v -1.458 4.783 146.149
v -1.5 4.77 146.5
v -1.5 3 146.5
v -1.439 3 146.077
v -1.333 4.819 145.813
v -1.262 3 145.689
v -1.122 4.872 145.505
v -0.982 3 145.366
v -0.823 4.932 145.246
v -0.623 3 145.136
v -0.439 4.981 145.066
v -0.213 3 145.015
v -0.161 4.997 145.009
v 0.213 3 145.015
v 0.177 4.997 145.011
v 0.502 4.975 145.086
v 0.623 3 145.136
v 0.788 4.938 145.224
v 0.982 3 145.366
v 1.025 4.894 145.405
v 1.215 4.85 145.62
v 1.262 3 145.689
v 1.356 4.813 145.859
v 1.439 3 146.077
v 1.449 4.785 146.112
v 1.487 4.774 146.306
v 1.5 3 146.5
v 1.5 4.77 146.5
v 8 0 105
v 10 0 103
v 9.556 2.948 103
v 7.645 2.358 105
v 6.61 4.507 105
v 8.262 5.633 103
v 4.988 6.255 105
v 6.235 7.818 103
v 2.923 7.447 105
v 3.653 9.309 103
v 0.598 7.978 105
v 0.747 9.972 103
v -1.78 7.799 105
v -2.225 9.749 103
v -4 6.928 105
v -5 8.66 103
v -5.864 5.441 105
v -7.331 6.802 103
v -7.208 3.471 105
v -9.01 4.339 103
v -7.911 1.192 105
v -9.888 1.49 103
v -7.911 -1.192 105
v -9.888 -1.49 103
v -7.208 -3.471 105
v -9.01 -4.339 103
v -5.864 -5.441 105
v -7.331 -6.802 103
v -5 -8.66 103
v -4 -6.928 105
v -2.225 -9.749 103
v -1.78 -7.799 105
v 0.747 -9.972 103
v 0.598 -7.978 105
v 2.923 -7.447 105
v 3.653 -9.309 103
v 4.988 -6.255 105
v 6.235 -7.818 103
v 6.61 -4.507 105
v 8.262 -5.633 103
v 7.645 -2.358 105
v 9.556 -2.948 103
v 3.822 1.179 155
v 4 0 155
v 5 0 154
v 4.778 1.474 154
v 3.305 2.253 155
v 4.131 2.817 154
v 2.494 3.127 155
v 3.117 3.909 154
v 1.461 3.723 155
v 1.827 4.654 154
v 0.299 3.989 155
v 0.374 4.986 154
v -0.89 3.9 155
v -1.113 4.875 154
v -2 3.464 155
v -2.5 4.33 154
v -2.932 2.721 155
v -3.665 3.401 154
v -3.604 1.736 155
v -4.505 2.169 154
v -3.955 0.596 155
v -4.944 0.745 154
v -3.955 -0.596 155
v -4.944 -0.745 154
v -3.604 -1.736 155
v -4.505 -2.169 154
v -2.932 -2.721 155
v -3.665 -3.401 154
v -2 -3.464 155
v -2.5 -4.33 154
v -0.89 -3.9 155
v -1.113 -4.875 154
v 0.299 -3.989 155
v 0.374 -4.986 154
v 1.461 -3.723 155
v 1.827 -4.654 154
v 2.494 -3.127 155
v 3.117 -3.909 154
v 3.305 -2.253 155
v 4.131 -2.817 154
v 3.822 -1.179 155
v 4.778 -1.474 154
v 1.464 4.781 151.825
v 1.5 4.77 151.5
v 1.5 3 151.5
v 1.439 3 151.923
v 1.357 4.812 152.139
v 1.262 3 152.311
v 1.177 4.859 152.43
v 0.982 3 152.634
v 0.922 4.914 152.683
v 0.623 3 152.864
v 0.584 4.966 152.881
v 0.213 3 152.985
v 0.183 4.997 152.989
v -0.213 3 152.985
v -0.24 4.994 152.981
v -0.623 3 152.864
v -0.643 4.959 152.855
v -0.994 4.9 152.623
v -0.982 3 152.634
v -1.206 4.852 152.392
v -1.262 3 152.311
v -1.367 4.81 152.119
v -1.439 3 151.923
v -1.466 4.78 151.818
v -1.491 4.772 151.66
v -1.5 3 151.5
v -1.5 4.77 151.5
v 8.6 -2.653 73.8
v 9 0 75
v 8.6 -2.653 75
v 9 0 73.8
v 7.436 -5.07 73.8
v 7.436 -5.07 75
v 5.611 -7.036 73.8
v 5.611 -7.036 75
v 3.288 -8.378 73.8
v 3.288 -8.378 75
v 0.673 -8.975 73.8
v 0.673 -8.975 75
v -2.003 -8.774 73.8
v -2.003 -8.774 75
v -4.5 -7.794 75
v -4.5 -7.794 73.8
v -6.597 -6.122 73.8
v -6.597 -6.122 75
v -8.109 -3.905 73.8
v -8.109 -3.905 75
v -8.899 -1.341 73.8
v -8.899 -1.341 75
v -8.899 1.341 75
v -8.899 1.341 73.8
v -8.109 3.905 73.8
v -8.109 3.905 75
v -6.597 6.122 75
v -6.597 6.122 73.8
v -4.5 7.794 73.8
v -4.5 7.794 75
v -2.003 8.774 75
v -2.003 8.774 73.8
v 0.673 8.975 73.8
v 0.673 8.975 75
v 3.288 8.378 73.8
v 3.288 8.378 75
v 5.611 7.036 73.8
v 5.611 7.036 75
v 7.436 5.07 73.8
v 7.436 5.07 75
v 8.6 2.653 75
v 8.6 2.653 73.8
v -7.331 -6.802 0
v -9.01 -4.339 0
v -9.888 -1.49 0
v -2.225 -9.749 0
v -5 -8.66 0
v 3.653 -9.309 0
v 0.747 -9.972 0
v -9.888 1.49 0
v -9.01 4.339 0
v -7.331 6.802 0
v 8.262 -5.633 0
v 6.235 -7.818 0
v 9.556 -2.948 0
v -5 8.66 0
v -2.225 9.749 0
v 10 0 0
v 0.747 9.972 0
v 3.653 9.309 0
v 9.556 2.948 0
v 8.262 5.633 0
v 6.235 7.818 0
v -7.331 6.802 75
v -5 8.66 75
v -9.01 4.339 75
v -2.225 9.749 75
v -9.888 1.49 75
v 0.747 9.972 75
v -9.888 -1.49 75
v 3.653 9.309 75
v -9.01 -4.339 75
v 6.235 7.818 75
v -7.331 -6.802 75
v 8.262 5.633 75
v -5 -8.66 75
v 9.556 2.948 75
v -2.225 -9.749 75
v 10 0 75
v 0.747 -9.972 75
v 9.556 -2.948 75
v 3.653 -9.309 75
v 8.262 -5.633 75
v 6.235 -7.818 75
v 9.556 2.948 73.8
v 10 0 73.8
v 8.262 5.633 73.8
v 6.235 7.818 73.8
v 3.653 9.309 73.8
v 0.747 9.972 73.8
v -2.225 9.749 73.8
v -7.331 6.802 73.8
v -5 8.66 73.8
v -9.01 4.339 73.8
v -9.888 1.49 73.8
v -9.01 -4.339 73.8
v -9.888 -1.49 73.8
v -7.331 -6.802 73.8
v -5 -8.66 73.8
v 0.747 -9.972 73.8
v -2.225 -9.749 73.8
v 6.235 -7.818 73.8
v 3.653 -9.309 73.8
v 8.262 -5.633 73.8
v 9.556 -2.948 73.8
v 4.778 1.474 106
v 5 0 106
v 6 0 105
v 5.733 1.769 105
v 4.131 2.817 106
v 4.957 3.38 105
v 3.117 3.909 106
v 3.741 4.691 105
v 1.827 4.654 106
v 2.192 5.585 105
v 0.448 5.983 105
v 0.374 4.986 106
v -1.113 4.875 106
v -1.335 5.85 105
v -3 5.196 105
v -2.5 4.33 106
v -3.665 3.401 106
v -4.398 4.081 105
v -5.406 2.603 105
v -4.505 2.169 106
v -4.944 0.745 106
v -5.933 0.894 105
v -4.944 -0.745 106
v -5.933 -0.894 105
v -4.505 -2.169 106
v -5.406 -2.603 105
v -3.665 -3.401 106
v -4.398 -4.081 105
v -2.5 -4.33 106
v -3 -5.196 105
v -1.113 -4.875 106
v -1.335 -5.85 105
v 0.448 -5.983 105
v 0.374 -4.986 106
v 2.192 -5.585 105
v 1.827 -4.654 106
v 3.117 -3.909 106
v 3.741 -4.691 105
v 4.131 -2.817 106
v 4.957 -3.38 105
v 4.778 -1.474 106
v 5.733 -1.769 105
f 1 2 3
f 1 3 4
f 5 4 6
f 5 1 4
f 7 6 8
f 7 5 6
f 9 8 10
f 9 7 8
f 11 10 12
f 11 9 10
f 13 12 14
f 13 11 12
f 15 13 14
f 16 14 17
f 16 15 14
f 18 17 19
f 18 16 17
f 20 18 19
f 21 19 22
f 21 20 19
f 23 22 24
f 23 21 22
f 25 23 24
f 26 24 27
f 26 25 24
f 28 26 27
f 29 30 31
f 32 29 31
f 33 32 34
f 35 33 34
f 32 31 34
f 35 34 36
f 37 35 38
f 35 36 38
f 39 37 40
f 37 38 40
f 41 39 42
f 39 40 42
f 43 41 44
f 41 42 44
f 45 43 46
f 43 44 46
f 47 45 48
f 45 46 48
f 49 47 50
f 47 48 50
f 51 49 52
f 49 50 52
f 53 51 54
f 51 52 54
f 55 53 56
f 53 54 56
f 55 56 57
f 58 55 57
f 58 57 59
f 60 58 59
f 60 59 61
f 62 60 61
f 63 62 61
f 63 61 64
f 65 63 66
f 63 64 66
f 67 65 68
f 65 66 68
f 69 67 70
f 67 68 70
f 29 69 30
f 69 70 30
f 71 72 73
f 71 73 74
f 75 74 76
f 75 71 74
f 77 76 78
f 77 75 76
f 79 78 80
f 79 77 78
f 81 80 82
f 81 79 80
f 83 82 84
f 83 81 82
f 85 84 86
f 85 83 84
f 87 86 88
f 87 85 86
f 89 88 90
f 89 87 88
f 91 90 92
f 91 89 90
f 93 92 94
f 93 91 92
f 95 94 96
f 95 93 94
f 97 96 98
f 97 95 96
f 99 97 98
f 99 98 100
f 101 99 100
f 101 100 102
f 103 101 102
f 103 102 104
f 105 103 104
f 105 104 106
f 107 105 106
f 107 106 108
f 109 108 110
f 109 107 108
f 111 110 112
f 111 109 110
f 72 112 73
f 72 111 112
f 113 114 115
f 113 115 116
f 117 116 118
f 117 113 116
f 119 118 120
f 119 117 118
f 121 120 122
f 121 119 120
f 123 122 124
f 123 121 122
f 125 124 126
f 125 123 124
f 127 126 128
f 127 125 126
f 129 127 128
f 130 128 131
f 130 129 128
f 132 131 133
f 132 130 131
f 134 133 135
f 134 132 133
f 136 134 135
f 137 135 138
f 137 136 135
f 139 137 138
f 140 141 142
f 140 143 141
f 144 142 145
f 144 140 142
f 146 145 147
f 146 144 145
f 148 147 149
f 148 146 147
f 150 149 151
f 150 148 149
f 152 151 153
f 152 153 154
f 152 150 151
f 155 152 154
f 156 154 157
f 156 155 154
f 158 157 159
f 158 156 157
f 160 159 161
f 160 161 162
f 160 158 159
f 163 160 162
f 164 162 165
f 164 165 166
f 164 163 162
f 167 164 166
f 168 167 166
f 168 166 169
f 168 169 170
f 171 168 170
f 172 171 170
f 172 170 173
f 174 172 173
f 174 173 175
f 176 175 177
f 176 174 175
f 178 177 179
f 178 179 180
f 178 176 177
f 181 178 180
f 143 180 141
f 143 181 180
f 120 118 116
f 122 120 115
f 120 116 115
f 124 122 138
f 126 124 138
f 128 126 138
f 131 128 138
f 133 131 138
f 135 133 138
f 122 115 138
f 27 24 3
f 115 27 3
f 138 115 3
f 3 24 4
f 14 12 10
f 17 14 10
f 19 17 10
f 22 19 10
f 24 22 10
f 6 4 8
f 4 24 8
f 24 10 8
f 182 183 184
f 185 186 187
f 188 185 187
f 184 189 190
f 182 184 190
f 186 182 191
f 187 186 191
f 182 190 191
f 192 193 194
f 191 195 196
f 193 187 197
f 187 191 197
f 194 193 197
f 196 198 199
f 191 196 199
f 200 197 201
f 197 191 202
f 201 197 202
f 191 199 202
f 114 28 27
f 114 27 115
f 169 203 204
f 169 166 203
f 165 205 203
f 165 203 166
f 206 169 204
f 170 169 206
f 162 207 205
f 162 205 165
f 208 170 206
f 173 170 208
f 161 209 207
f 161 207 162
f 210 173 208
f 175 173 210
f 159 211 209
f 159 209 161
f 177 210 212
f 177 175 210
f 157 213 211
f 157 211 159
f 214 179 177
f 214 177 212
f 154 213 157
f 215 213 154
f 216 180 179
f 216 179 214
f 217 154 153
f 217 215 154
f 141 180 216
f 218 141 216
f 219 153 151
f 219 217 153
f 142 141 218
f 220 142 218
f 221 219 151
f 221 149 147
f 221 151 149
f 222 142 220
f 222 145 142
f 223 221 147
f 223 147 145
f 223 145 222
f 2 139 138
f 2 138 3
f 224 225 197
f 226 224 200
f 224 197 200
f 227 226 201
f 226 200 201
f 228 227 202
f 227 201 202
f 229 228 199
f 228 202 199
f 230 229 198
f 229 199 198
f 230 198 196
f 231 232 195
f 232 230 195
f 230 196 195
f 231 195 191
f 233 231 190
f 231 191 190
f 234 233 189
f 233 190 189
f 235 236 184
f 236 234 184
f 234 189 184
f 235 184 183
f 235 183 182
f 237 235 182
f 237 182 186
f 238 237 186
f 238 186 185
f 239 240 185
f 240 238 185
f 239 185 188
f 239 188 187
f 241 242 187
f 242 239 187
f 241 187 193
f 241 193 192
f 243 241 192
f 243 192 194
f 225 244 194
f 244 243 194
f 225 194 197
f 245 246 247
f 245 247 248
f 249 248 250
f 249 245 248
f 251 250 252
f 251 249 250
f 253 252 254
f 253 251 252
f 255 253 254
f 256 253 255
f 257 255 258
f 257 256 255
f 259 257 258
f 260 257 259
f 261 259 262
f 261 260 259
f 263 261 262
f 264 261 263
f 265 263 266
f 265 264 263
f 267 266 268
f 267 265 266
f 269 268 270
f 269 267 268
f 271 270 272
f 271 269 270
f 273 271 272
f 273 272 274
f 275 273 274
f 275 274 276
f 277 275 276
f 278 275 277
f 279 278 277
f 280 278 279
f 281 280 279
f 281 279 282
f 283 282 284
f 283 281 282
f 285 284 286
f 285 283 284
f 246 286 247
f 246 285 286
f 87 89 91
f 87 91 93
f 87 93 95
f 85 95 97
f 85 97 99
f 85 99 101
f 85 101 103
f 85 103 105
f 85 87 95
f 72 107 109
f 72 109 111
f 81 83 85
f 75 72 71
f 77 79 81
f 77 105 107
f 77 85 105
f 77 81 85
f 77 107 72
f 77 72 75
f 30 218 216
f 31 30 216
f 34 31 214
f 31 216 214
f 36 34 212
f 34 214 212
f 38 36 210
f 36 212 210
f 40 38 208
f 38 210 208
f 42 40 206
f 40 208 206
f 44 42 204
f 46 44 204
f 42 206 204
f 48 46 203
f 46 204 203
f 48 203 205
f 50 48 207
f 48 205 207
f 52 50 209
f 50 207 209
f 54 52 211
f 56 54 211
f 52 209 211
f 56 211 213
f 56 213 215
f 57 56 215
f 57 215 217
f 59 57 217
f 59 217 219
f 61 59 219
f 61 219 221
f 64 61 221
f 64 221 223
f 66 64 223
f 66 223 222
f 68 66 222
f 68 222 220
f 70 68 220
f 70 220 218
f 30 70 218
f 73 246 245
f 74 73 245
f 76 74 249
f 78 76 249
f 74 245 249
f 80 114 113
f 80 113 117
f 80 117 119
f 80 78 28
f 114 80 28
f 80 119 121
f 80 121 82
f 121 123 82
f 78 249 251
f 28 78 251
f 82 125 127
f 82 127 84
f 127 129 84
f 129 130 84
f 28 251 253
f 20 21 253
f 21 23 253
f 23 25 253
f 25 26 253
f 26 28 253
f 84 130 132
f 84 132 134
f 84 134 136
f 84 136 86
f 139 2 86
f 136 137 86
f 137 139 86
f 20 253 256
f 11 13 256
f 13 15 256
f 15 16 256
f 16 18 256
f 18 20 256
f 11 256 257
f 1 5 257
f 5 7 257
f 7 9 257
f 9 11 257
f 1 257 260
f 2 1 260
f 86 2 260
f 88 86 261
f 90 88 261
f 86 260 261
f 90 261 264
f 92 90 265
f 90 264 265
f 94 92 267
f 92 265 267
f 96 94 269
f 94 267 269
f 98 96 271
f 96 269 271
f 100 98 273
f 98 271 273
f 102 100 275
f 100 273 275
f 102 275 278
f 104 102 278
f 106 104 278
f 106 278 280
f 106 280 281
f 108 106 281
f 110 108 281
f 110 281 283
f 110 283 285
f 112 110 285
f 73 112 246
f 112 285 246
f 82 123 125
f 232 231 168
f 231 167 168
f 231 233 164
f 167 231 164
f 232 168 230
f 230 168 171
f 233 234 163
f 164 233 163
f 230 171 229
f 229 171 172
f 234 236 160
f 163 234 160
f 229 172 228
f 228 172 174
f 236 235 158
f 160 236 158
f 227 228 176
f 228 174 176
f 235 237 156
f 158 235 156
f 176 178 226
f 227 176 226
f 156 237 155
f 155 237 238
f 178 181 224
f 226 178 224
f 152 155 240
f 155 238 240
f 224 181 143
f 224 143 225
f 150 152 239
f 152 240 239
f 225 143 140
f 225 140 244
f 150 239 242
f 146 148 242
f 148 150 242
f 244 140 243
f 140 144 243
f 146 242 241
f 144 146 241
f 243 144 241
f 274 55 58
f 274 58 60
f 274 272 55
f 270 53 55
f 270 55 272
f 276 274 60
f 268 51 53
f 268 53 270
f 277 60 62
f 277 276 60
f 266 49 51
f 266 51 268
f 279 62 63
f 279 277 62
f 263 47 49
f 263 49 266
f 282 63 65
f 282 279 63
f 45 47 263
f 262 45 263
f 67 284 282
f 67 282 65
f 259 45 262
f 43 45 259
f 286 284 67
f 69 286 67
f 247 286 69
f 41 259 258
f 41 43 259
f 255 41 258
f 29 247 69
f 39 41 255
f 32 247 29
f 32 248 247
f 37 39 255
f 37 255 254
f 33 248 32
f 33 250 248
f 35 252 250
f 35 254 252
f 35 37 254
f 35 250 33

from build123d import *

# Parameters (mm, degrees)
SZKIC1_R                    = 10
DODANIE_WYCI_GNI_CIE1_DEPTH = 105
SZKIC2_R                    = 5
DODANIE_WYCI_GNI_CIE2_DEPTH = 50
WYTNIJ_WYCI_GNI_CIE1_DEPTH  = 2
SFAZOWANIE1_SIZE            = 1
SFAZOWANIE2_SIZE            = 2
SFAZOWANIE3_SIZE            = 1
SZKIC5_W                    = 1
SZKIC5_H                    = 1.2


with BuildPart() as part:
    # Szkic1 → Dodanie-wyciągnięcie1 (new body)
    with BuildSketch(Plane.XY):
        Circle(SZKIC1_R)
    extrude(amount=DODANIE_WYCI_GNI_CIE1_DEPTH)

    # Szkic2 → Dodanie-wyciągnięcie2 (add)
    with BuildSketch(Plane.XY.offset(105)):
        Circle(SZKIC2_R)
    extrude(amount=DODANIE_WYCI_GNI_CIE2_DEPTH)

    # Szkic3 → Wytnij-wyciągnięcie1 (cut)
    with BuildSketch(Plane(origin=(0, 5, 0), x_dir=(1, 0, 0), z_dir=(0, 1, 0))):
        with BuildLine():
            Line((-1.5, -151.5), (-1.5, -146.5))
            ThreePointArc((-1.5, -146.5), (0, -145), (1.5, -146.5))
            Line((1.5, -146.5), (1.5, -151.5))
            ThreePointArc((1.5, -151.5), (0, -153), (-1.5, -151.5))
        make_face()
    extrude(amount=-WYTNIJ_WYCI_GNI_CIE1_DEPTH, mode=Mode.SUBTRACT)

    # Sfazowanie1
    sfazowanie1_edges = [part.edges().sort_by_distance(p)[0] for p in [
        (-5, 0, 105),
    ]]
    chamfer(sfazowanie1_edges, length=SFAZOWANIE1_SIZE)

    # Sfazowanie2
    sfazowanie2_edges = [part.edges().sort_by_distance(p)[0] for p in [
        (-10, 0, 105),
    ]]
    chamfer(sfazowanie2_edges, length=SFAZOWANIE2_SIZE)

    # Sfazowanie3
    sfazowanie3_edges = [part.edges().sort_by_distance(p)[0] for p in [
        (-5, 0, 155),
    ]]
    chamfer(sfazowanie3_edges, length=SFAZOWANIE3_SIZE)

    # Szkic5 → Wycięcie-obrót1 (revolve, cut)
    with BuildSketch(Plane(origin=(0, 0, 0), x_dir=(1, 0, 0), z_dir=(0, 1, 0)), mode=Mode.PRIVATE) as wyci_cie_obr_t1_sk:
        with Locations((-9.5, -74.4)):
            Rectangle(SZKIC5_W, SZKIC5_H)
    revolve(wyci_cie_obr_t1_sk.sketch.rotate(Axis((0, 0, 106), (0, 0, -1)), 180), axis=Axis((0, 0, 106), (0, 0, -1)), mode=Mode.SUBTRACT)


solid = part.part
